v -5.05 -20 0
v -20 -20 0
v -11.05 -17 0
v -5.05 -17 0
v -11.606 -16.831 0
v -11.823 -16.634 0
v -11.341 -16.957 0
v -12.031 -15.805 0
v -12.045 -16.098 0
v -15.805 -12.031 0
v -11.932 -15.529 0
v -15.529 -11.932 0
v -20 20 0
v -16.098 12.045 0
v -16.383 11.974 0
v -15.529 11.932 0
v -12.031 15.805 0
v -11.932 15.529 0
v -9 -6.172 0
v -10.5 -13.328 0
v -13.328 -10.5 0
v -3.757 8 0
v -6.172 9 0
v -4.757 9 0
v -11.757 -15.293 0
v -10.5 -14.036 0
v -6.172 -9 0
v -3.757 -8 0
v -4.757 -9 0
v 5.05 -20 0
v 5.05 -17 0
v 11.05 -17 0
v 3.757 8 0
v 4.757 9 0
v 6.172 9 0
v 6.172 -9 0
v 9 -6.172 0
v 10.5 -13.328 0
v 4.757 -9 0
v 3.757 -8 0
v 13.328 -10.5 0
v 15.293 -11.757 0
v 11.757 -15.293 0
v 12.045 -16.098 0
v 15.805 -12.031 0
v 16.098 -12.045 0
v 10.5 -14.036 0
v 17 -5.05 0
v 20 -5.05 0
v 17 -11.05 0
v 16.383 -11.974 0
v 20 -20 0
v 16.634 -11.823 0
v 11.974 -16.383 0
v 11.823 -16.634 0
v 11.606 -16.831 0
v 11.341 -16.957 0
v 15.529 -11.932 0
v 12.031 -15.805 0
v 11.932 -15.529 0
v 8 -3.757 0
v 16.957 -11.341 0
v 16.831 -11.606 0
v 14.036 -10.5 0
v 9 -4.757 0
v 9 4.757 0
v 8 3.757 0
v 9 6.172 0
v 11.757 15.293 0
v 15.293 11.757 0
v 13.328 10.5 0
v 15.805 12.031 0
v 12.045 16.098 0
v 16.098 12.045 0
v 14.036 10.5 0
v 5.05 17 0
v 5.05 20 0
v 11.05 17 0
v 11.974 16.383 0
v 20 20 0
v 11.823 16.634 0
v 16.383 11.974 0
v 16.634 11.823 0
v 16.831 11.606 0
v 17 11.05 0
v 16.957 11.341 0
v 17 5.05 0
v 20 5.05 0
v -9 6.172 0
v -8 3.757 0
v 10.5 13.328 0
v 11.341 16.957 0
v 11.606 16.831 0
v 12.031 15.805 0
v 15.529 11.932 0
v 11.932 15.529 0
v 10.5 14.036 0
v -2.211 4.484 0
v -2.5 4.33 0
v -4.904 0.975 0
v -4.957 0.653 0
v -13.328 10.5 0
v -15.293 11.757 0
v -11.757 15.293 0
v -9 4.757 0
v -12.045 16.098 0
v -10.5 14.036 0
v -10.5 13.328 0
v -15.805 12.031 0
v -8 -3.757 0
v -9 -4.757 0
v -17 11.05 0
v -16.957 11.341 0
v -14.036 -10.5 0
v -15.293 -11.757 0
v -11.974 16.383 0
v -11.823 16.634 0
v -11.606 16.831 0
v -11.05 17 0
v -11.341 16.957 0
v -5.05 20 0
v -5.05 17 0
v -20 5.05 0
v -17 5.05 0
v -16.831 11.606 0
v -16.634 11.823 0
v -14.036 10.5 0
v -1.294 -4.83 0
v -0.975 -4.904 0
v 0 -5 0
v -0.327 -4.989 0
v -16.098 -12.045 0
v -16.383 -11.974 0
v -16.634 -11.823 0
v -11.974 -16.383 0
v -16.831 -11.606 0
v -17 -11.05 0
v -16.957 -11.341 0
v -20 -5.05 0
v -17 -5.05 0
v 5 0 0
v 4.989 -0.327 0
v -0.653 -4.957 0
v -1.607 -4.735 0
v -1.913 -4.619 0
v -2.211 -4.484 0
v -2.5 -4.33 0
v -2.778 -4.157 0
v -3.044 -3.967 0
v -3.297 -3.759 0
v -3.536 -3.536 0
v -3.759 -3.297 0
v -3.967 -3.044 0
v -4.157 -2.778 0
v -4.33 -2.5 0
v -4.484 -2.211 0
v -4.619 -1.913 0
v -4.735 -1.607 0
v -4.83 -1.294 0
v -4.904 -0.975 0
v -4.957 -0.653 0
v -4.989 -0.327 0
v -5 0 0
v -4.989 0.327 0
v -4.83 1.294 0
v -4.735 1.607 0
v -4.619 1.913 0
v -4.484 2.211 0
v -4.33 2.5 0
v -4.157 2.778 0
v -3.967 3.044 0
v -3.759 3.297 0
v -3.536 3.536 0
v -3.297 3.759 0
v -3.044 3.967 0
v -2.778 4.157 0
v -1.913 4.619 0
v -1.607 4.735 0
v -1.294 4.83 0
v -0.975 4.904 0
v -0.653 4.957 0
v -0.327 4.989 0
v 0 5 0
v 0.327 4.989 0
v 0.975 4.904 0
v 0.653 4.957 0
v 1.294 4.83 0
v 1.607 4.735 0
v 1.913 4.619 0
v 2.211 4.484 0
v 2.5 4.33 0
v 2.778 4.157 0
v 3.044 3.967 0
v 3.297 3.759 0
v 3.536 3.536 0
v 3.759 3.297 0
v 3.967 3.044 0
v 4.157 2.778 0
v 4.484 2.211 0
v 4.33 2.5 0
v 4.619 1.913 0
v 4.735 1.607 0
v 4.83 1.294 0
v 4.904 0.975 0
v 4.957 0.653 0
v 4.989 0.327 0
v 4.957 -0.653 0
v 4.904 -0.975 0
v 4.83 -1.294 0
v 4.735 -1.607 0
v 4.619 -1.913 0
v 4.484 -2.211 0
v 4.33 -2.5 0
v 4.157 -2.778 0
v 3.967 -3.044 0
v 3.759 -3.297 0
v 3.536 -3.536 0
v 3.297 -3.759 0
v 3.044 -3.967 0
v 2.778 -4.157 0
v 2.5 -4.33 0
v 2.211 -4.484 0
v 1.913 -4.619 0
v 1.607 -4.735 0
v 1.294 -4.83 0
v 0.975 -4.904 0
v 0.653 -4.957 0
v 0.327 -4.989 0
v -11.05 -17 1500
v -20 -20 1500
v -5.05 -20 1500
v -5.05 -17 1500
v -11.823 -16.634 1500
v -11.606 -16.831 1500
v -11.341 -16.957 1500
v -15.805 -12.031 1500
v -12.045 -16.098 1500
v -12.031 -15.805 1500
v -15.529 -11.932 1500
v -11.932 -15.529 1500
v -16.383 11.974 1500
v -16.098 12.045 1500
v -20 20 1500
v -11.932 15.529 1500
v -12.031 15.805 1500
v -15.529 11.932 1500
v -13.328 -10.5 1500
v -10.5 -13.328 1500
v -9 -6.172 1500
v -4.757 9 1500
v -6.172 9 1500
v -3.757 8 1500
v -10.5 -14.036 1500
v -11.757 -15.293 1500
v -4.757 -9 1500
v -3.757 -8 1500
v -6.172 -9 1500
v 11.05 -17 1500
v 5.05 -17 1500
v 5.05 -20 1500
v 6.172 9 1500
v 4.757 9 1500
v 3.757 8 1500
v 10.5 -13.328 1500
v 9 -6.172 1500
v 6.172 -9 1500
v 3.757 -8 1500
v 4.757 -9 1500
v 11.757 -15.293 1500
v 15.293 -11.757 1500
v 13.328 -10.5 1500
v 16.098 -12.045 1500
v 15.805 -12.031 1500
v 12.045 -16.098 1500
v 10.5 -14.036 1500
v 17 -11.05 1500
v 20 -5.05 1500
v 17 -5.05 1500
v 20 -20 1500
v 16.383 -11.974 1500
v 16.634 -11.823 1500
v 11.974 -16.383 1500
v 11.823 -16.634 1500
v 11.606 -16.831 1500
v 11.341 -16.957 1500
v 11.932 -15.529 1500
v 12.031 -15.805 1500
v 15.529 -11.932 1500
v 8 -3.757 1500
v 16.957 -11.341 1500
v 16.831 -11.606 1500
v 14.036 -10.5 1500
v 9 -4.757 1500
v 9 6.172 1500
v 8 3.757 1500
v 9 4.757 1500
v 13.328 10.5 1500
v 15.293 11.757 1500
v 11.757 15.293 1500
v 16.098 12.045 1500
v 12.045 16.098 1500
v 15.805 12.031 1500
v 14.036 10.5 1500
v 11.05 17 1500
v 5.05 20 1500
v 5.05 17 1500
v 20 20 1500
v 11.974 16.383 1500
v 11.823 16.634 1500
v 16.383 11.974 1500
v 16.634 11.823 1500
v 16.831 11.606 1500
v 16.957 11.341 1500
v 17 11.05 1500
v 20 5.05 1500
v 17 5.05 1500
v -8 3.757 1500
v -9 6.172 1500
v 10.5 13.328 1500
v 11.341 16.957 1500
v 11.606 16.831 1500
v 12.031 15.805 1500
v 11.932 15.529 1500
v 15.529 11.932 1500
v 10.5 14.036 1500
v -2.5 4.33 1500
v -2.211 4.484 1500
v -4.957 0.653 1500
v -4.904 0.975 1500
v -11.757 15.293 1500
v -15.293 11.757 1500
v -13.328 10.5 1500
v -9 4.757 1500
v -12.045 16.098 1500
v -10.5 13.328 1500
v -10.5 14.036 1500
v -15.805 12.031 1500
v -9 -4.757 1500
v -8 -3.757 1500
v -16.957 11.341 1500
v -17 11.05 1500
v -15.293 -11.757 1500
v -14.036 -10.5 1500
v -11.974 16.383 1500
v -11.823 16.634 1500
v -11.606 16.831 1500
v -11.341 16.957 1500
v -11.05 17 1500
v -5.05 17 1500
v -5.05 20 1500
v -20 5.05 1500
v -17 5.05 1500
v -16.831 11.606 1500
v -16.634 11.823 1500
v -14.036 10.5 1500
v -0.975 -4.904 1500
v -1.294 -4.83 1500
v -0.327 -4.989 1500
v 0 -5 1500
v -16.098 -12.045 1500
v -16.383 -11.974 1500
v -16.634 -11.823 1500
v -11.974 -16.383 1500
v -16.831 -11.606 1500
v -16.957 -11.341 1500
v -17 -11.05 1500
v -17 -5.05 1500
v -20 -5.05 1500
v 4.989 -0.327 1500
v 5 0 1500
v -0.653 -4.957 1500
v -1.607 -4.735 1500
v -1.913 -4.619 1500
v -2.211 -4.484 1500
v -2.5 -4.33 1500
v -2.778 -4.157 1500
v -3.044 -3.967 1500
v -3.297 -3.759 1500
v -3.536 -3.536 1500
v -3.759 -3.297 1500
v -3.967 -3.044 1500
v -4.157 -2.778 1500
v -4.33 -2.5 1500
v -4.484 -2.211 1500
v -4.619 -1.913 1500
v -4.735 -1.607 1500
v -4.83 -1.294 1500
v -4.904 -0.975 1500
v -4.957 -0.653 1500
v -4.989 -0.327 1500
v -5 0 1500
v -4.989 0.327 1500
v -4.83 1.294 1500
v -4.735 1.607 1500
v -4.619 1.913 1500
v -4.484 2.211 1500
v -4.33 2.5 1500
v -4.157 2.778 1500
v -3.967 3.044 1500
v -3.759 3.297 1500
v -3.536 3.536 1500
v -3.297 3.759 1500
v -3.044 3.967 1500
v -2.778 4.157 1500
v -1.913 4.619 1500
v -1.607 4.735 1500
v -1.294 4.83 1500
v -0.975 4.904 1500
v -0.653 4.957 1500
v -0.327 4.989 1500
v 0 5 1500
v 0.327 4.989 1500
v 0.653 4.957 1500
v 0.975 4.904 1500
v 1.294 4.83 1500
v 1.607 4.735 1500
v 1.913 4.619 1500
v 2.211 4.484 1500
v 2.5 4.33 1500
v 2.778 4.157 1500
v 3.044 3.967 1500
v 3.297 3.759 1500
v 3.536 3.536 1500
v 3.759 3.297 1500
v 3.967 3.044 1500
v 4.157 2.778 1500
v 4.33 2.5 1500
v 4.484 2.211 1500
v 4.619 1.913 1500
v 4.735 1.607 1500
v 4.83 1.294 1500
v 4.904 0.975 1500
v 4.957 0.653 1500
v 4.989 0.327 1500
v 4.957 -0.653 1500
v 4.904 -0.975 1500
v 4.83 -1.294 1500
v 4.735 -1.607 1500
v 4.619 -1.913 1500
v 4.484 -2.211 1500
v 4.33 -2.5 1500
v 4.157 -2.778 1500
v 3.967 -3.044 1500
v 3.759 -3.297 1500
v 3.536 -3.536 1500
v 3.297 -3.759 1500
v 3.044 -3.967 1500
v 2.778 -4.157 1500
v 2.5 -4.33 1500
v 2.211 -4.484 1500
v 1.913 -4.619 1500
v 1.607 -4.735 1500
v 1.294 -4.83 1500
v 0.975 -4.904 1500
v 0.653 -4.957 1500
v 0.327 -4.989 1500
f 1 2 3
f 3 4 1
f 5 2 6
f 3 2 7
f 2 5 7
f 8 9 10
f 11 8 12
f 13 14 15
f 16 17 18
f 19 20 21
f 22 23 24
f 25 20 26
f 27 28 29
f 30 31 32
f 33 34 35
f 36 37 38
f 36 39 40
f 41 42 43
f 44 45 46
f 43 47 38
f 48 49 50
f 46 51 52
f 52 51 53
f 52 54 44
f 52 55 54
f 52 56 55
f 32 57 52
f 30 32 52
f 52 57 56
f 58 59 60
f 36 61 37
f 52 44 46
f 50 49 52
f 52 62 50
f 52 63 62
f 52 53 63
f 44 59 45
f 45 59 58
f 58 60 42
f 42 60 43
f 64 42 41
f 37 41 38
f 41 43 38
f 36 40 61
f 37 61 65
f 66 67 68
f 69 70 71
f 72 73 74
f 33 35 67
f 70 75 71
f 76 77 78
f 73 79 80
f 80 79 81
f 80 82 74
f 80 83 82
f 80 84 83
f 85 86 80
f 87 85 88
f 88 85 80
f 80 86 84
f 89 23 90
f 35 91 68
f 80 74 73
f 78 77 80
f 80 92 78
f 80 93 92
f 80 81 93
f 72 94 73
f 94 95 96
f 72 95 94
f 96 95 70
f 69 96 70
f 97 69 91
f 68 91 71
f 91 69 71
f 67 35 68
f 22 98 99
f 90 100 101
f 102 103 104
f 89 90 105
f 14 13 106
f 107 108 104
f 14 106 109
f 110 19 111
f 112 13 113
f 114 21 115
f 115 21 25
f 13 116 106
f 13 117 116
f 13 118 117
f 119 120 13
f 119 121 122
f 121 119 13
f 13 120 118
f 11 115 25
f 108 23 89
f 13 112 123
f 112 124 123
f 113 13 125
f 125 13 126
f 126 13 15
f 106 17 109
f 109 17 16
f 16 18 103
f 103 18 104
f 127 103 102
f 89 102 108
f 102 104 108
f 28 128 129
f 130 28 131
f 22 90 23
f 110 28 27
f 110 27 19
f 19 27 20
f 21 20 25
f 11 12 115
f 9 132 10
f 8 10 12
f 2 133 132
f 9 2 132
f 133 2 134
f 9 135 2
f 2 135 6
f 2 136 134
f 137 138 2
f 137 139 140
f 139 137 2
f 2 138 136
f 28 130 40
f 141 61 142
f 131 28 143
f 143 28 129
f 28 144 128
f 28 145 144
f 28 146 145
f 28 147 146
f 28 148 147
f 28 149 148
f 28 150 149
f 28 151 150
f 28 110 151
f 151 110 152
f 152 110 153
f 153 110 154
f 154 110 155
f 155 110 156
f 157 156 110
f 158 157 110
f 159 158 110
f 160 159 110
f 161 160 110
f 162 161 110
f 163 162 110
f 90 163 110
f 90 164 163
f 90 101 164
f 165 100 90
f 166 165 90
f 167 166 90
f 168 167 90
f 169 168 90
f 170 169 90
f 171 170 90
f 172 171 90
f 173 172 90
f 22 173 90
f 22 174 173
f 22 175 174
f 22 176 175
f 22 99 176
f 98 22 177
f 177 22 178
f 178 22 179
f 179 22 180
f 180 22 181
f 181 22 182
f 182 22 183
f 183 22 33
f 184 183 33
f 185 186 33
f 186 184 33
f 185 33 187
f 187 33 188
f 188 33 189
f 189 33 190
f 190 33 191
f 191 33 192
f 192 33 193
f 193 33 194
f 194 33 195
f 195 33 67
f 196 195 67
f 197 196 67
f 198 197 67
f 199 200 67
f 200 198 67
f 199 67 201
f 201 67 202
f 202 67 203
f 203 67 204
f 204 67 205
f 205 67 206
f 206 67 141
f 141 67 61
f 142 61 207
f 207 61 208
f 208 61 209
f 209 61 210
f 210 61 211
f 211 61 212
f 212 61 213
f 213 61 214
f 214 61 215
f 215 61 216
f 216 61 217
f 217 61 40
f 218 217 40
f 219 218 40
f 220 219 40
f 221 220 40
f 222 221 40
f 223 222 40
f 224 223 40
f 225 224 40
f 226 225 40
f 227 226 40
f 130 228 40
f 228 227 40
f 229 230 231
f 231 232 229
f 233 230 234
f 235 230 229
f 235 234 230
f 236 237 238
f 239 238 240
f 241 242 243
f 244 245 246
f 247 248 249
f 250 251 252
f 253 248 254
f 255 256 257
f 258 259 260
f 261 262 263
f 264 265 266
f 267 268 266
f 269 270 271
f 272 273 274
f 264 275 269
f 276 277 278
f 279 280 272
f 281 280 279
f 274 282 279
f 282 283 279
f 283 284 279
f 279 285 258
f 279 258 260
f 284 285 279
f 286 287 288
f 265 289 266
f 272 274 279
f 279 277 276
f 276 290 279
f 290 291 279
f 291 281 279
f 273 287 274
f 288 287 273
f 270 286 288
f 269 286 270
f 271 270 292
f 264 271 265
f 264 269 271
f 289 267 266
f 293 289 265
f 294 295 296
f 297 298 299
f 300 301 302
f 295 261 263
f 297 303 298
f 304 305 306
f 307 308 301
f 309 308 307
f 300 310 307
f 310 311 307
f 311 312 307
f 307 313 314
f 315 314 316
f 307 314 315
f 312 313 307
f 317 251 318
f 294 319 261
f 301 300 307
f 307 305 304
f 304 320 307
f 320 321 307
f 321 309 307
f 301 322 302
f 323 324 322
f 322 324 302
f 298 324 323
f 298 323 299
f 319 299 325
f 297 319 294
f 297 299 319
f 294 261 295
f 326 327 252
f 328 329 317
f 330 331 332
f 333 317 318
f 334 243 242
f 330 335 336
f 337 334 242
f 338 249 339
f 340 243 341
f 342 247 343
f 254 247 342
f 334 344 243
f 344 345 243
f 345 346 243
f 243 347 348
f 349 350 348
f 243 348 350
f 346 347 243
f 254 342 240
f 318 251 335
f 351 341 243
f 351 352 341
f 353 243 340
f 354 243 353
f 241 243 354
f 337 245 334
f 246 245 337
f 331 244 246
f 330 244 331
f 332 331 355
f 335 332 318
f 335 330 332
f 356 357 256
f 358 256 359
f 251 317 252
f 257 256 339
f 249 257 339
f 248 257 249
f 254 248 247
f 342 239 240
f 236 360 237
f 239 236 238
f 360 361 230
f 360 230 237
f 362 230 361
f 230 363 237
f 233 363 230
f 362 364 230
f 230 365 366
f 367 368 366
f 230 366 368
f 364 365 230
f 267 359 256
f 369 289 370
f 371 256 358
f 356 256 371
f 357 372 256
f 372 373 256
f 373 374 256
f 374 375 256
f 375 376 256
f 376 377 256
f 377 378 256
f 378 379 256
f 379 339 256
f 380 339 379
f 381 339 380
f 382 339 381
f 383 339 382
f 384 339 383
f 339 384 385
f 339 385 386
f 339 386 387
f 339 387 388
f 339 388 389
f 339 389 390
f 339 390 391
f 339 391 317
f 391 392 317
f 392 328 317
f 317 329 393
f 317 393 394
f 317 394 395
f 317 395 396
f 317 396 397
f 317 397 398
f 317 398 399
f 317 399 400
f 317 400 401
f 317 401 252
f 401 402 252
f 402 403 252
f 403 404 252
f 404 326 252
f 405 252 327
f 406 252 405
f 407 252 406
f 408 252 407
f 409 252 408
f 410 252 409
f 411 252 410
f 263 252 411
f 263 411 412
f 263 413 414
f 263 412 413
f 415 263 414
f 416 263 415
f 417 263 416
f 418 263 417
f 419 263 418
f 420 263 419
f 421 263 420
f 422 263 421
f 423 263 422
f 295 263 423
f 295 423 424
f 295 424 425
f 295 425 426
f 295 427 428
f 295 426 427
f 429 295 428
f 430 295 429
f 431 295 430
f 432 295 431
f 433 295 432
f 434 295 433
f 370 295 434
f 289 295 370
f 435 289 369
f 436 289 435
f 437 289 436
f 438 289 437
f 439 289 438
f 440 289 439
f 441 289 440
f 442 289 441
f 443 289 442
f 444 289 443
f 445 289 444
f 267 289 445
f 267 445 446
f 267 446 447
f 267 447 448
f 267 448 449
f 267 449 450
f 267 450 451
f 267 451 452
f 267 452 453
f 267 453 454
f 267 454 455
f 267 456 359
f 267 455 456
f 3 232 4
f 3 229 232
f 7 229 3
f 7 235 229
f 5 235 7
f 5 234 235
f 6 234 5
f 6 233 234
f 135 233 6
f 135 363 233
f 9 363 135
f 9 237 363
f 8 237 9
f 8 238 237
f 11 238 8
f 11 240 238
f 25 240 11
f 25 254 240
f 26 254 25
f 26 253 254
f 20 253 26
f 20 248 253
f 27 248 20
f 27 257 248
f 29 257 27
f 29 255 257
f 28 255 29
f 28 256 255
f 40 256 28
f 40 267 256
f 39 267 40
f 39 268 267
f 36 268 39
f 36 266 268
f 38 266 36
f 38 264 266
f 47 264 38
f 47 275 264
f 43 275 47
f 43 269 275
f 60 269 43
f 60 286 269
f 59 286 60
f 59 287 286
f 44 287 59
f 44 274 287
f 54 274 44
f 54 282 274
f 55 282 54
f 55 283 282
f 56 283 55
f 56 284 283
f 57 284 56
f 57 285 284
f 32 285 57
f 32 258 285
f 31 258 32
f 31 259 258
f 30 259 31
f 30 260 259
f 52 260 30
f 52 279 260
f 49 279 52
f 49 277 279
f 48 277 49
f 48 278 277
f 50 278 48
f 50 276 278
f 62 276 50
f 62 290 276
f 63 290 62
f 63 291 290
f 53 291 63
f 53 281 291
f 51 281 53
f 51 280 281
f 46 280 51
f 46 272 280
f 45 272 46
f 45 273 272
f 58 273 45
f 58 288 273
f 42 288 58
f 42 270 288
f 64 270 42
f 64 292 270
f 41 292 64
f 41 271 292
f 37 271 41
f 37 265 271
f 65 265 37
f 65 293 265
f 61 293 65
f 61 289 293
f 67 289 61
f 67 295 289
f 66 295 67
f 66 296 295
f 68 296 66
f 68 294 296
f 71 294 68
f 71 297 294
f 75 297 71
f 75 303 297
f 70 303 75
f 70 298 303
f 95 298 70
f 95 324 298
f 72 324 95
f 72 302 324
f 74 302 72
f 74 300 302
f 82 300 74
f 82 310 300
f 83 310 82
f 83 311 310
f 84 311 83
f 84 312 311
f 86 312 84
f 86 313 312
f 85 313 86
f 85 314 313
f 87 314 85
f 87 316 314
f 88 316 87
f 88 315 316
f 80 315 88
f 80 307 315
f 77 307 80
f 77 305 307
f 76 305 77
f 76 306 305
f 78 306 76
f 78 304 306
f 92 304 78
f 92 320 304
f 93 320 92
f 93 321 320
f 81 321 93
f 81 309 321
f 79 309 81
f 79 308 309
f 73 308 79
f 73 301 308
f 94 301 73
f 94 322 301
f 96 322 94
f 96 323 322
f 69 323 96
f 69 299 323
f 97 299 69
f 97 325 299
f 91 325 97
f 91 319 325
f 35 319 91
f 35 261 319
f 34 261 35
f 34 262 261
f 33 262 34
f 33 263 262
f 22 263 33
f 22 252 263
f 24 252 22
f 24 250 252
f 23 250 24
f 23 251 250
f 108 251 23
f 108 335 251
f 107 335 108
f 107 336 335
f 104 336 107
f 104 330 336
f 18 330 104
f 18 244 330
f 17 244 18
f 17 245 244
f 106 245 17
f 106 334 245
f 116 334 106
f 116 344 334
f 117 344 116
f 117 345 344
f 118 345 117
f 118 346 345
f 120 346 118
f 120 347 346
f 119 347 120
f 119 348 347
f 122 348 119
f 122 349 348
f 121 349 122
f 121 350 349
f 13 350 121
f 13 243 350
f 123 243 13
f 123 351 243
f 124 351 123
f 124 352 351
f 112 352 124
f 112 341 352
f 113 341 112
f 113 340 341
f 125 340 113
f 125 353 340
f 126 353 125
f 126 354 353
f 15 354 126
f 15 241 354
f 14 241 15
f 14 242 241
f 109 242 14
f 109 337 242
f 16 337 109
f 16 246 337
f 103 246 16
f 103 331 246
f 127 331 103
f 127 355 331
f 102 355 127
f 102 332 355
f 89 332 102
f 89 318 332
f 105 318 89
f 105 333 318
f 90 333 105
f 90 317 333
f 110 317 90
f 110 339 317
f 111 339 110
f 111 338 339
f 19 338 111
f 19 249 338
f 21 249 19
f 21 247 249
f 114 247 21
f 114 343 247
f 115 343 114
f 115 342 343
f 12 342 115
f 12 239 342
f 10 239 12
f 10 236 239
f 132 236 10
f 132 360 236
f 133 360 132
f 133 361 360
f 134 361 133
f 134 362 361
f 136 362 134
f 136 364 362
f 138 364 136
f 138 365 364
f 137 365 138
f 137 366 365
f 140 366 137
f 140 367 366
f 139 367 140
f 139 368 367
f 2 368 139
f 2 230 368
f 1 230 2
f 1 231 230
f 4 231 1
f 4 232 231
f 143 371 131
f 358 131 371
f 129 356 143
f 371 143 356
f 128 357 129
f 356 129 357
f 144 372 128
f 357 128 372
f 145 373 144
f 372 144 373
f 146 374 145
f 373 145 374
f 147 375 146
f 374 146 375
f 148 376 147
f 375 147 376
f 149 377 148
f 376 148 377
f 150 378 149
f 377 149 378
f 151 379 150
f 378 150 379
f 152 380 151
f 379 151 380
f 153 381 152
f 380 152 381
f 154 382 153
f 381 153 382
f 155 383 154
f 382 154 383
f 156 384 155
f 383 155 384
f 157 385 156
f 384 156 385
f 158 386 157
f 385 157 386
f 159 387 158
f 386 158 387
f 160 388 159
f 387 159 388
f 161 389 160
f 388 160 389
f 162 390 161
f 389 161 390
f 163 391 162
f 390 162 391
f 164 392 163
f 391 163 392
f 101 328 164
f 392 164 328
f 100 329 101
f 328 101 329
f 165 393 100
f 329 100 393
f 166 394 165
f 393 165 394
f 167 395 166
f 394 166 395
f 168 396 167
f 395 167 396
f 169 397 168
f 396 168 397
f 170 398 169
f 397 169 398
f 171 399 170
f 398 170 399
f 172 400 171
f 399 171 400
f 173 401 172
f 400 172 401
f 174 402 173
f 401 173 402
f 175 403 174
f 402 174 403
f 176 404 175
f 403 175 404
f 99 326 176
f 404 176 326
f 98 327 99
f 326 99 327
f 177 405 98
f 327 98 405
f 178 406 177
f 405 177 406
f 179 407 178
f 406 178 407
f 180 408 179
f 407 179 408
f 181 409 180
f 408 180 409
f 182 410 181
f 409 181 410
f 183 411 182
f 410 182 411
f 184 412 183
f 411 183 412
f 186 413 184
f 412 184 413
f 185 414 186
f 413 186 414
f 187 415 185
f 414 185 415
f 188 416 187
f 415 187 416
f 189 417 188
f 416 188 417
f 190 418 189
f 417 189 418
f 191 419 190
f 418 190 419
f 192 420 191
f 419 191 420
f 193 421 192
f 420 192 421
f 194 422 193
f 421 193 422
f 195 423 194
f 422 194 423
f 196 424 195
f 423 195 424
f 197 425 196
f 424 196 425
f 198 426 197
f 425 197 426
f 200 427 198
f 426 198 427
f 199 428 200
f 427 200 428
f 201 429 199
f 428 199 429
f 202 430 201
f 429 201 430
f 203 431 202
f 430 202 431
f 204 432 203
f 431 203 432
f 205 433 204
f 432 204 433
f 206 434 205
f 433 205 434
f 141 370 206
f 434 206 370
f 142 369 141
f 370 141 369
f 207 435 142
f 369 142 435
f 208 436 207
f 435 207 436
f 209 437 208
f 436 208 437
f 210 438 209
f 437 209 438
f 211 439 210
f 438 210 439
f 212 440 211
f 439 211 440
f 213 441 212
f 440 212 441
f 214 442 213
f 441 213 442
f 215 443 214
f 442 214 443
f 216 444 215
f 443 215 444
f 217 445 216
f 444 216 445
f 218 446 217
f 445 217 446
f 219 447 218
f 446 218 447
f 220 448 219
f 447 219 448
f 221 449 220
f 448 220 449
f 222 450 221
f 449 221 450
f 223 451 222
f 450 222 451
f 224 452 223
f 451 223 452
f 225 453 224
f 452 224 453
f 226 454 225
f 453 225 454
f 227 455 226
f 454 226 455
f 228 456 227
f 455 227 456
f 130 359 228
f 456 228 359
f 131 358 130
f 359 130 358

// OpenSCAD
/* ---------------------------------------------------------------------------
   T-slot extruded aluminum, 40x40 mm — mk Technology Group profile 2040.01
   (article 54.01.0100), "Nut 10" series: one 10.1 mm T-slot per face, a
   center M8-clearance through-bore, and 1 mm fillets throughout.

   The cross-section polygon below is not a hand-modelled approximation: it
   was reconstructed point-for-point from the manufacturer's own DXF cross-
   section drawing (`40x40_profile/54.01.0100(00-00-0)(000)_right.dxf`,
   confirmed to be the true section view since it's the only one of the three
   DXFs carrying ARC/CIRCLE entities — front/top are just plain rectangles).
   Each 1 mm fillet arc was tessellated to 8 segments. The bore is instead
   subtracted as a live `circle()`, so bore_dia is the one dimension that is
   genuinely adjustable in the Customizer without touching the polygon.

   Coordinate convention: cross-section centred on the bore axis (X=Y=0,
   profile spans -20..+20 both ways), extruded from Z=0 to Z=length — so a
   bar sits with one cut end on the Z=0 plane, ready to translate into an
   assembly.

   This is purchased stock, not a printed part, so unlike the other files in
   this directory it carries no [Build Plate] or [Revision] engraving group
   — there's nothing to lay out on a print bed or stamp a rev number into.

   REV 1.0: initial — 1.5 m stock length to block in the mockup.
   --------------------------------------------------------------------------- */

/* [Extrusion] */
length   = 1500; // cut length along Z, mm  [50:50:6100]
bore_dia = 10;    // center through-bore diameter, mm (0 = solid, no bore)

/* [Render] */
$fn = $preview ? 32 : 96;

/* [Hidden] */
// Profile polygon, centred on the bore axis. Reconstructed from the mfr DXF;
// see header. Do not hand-edit — regenerate from the DXF if the physical
// part is ever re-measured and found to differ.
profile_pts = [
    [-17.000,-5.050], [-20.000,-5.050], [-20.000,-20.000], [-5.050,-20.000], [-5.050,-17.000], [-11.050,-17.000],
    [-11.341,-16.957], [-11.606,-16.831], [-11.823,-16.634], [-11.974,-16.383], [-12.045,-16.098], [-12.031,-15.805],
    [-11.932,-15.529], [-11.757,-15.293], [-10.500,-14.036], [-10.500,-13.328], [-6.172,-9.000], [-4.757,-9.000],
    [-3.757,-8.000], [3.757,-8.000], [4.757,-9.000], [6.172,-9.000], [10.500,-13.328], [10.500,-14.036],
    [11.757,-15.293], [11.932,-15.529], [12.031,-15.805], [12.045,-16.098], [11.974,-16.383], [11.823,-16.634],
    [11.606,-16.831], [11.341,-16.957], [11.050,-17.000], [5.050,-17.000], [5.050,-20.000], [20.000,-20.000],
    [20.000,-5.050], [17.000,-5.050], [17.000,-11.050], [16.957,-11.341], [16.831,-11.606], [16.634,-11.823],
    [16.383,-11.974], [16.098,-12.045], [15.805,-12.031], [15.529,-11.932], [15.293,-11.757], [14.036,-10.500],
    [13.328,-10.500], [9.000,-6.172], [9.000,-4.757], [8.000,-3.757], [8.000,3.757], [9.000,4.757],
    [9.000,6.172], [13.328,10.500], [14.036,10.500], [15.293,11.757], [15.529,11.932], [15.805,12.031],
    [16.098,12.045], [16.383,11.974], [16.634,11.823], [16.831,11.606], [16.957,11.341], [17.000,11.050],
    [17.000,5.050], [20.000,5.050], [20.000,20.000], [5.050,20.000], [5.050,17.000], [11.050,17.000],
    [11.341,16.957], [11.606,16.831], [11.823,16.634], [11.974,16.383], [12.045,16.098], [12.031,15.805],
    [11.932,15.529], [11.757,15.293], [10.500,14.036], [10.500,13.328], [6.172,9.000], [4.757,9.000],
    [3.757,8.000], [-3.757,8.000], [-4.757,9.000], [-6.172,9.000], [-10.500,13.328], [-10.500,14.036],
    [-11.757,15.293], [-11.932,15.529], [-12.031,15.805], [-12.045,16.098], [-11.974,16.383], [-11.823,16.634],
    [-11.606,16.831], [-11.341,16.957], [-11.050,17.000], [-5.050,17.000], [-5.050,20.000], [-20.000,20.000],
    [-20.000,5.050], [-17.000,5.050], [-17.000,11.050], [-16.957,11.341], [-16.831,11.606], [-16.634,11.823],
    [-16.383,11.974], [-16.098,12.045], [-15.805,12.031], [-15.529,11.932], [-15.293,11.757], [-14.036,10.500],
    [-13.328,10.500], [-9.000,6.172], [-9.000,4.757], [-8.000,3.757], [-8.000,-3.757], [-9.000,-4.757],
    [-9.000,-6.172], [-13.328,-10.500], [-14.036,-10.500], [-15.293,-11.757], [-15.529,-11.932], [-15.805,-12.031],
    [-16.098,-12.045], [-16.383,-11.974], [-16.634,-11.823], [-16.831,-11.606], [-16.957,-11.341], [-17.000,-11.050],
];

// ---------------------------------------------------------------------------

module t_slot_40x40_profile() {
    difference() {
        polygon(points = profile_pts);
        if (bore_dia > 0) circle(d = bore_dia);
    }
}

module t_slot_40x40(len = length) {
    linear_extrude(height = len) t_slot_40x40_profile();
}

t_slot_40x40();
